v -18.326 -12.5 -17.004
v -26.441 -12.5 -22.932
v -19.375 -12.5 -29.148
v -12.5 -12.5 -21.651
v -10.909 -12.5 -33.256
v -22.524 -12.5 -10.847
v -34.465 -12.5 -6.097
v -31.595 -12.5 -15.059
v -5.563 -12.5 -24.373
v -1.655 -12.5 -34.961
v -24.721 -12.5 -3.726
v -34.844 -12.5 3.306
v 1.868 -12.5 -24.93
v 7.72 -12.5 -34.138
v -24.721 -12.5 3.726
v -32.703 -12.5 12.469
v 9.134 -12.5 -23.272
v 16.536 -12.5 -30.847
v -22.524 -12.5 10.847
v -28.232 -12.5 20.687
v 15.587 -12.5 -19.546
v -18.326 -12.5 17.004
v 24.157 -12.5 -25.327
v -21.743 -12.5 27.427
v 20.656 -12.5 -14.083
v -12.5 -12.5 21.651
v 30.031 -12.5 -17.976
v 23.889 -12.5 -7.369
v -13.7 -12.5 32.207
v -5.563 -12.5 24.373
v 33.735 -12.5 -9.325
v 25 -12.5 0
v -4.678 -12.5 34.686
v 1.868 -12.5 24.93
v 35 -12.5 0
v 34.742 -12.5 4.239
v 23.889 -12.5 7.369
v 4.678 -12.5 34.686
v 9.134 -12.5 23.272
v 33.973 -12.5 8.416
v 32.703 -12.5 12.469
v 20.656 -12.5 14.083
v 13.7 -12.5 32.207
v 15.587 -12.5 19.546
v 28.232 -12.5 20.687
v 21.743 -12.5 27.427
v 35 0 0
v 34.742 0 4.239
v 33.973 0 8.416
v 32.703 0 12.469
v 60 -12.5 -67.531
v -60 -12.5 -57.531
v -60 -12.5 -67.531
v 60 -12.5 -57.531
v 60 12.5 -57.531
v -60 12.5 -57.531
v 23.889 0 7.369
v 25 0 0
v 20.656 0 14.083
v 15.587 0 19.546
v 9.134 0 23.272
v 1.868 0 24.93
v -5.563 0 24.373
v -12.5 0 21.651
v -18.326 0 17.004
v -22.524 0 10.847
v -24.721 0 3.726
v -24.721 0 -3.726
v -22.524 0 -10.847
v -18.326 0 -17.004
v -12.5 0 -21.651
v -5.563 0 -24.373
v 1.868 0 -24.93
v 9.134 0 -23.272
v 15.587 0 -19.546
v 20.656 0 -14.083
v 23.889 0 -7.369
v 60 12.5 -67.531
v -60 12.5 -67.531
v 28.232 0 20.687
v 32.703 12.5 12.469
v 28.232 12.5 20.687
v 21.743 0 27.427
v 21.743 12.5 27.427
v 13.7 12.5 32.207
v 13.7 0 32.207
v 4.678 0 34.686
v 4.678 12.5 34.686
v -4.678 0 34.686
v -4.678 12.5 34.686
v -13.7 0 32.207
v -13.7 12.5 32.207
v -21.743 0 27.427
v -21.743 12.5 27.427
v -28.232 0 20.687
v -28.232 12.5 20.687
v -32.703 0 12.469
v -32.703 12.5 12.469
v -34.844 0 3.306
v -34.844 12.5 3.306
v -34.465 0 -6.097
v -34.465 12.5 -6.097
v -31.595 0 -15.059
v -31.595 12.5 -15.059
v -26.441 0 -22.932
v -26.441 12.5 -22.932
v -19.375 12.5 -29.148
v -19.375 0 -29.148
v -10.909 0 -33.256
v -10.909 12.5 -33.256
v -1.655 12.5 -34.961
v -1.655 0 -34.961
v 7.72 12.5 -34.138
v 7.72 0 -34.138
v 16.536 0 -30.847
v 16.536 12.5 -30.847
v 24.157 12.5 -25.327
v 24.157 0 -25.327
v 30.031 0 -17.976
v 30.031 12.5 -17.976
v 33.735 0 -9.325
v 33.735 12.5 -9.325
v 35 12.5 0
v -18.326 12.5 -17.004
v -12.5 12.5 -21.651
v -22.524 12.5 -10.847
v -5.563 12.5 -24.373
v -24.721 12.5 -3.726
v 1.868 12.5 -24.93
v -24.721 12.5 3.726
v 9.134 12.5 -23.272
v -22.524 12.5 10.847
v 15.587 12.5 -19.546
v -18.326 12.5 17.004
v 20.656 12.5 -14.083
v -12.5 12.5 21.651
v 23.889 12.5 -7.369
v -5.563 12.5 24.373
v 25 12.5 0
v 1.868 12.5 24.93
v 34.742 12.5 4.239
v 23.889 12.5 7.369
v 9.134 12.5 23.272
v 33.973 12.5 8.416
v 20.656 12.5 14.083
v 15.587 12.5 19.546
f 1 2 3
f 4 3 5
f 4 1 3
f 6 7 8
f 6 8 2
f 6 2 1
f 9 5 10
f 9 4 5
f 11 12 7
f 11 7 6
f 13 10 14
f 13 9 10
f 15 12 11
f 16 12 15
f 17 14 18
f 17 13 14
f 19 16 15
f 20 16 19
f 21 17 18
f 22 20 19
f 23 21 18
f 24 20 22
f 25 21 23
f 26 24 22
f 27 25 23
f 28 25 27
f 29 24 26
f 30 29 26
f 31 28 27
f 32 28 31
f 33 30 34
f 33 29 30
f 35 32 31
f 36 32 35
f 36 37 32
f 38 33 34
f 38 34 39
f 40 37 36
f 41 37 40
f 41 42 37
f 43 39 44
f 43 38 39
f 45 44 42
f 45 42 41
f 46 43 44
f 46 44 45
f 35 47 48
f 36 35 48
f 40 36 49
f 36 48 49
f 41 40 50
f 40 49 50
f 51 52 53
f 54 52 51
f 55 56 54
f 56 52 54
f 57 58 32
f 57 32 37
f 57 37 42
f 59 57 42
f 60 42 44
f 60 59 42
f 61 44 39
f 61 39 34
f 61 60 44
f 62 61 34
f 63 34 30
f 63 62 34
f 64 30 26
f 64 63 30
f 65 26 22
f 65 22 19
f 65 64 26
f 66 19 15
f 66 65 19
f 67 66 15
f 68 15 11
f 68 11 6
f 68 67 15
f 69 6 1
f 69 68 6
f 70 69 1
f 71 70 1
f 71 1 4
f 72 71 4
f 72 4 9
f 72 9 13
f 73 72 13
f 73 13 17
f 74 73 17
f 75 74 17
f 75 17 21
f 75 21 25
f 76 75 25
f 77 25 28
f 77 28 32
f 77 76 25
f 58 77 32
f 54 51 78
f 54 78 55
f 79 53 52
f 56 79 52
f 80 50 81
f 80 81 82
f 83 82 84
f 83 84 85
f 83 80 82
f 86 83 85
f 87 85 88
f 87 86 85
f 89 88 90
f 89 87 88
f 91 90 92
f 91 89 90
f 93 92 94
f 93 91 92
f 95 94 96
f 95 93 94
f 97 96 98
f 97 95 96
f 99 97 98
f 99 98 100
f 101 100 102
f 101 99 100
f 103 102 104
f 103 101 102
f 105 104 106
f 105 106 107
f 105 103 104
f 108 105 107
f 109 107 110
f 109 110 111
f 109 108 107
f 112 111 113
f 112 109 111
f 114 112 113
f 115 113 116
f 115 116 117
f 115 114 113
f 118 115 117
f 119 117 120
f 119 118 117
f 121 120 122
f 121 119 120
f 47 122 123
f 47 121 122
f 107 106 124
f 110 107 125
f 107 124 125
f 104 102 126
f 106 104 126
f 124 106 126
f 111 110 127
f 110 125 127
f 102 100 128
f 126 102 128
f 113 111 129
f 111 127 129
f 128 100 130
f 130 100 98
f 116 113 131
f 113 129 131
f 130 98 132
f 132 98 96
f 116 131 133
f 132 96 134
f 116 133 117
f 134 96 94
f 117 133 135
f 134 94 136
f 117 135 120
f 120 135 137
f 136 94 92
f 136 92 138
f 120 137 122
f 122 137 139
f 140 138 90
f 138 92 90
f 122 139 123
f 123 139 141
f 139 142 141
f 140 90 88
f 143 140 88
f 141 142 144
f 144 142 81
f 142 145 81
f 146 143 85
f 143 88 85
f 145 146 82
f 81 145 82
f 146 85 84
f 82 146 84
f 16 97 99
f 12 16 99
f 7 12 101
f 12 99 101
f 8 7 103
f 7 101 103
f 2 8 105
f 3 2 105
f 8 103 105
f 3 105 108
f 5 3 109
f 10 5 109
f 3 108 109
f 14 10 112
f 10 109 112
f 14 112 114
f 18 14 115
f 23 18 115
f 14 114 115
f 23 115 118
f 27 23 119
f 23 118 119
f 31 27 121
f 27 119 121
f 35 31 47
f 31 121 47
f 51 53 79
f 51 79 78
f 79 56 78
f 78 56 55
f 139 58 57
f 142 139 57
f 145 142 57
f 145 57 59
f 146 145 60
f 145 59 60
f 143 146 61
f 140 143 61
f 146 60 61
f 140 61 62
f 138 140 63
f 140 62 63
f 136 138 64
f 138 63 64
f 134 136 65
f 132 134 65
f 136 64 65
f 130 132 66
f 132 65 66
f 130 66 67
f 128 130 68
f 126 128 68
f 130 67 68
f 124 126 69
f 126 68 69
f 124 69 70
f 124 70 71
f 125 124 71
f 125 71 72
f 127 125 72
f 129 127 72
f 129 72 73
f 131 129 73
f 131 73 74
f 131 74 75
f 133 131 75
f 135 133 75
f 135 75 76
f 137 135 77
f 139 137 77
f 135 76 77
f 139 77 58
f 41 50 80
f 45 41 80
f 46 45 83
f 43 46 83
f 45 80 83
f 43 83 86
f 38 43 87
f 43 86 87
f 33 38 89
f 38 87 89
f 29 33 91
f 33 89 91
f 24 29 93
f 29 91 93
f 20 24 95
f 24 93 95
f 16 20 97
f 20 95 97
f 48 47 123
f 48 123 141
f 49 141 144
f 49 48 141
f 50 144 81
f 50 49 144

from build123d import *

# Parameters (mm, degrees)
F0_R     = 25
F1_DEPTH = 12.5
F0_W     = 120
F0_H     = 10


# Not quite as in the source:
# - a feature names something its author has since deleted; it is built from what else it names


with BuildPart() as f1:
    # F0 (on Front) → F1 (new body, symmetric)
    with BuildSketch(Plane.XZ):
        with BuildLine():
            ThreePointArc((-32.7034839498, 12.4692476737), (-6.3394819094, -34.4210832067), (35, 0))
            ThreePointArc((35, 0), (34.4210832067, 6.3394819094), (32.7034839498, 12.4692476737))
            ThreePointArc((32.7034839498, 12.4692476737), (0, 35), (-32.7034839498, 12.4692476737))
        make_face()
        Circle(F0_R, mode=Mode.SUBTRACT)
    extrude(amount=F1_DEPTH, both=True)


with BuildPart() as f1b:
    # F0 (on Front) → F1, piece 2 (new body, symmetric)
    with BuildSketch(Plane.XZ):
        with Locations((0, -62.5307523263)):
            Rectangle(F0_W, F0_H)
    extrude(amount=F1_DEPTH, both=True)


solid = Compound([f1.part, f1b.part])
